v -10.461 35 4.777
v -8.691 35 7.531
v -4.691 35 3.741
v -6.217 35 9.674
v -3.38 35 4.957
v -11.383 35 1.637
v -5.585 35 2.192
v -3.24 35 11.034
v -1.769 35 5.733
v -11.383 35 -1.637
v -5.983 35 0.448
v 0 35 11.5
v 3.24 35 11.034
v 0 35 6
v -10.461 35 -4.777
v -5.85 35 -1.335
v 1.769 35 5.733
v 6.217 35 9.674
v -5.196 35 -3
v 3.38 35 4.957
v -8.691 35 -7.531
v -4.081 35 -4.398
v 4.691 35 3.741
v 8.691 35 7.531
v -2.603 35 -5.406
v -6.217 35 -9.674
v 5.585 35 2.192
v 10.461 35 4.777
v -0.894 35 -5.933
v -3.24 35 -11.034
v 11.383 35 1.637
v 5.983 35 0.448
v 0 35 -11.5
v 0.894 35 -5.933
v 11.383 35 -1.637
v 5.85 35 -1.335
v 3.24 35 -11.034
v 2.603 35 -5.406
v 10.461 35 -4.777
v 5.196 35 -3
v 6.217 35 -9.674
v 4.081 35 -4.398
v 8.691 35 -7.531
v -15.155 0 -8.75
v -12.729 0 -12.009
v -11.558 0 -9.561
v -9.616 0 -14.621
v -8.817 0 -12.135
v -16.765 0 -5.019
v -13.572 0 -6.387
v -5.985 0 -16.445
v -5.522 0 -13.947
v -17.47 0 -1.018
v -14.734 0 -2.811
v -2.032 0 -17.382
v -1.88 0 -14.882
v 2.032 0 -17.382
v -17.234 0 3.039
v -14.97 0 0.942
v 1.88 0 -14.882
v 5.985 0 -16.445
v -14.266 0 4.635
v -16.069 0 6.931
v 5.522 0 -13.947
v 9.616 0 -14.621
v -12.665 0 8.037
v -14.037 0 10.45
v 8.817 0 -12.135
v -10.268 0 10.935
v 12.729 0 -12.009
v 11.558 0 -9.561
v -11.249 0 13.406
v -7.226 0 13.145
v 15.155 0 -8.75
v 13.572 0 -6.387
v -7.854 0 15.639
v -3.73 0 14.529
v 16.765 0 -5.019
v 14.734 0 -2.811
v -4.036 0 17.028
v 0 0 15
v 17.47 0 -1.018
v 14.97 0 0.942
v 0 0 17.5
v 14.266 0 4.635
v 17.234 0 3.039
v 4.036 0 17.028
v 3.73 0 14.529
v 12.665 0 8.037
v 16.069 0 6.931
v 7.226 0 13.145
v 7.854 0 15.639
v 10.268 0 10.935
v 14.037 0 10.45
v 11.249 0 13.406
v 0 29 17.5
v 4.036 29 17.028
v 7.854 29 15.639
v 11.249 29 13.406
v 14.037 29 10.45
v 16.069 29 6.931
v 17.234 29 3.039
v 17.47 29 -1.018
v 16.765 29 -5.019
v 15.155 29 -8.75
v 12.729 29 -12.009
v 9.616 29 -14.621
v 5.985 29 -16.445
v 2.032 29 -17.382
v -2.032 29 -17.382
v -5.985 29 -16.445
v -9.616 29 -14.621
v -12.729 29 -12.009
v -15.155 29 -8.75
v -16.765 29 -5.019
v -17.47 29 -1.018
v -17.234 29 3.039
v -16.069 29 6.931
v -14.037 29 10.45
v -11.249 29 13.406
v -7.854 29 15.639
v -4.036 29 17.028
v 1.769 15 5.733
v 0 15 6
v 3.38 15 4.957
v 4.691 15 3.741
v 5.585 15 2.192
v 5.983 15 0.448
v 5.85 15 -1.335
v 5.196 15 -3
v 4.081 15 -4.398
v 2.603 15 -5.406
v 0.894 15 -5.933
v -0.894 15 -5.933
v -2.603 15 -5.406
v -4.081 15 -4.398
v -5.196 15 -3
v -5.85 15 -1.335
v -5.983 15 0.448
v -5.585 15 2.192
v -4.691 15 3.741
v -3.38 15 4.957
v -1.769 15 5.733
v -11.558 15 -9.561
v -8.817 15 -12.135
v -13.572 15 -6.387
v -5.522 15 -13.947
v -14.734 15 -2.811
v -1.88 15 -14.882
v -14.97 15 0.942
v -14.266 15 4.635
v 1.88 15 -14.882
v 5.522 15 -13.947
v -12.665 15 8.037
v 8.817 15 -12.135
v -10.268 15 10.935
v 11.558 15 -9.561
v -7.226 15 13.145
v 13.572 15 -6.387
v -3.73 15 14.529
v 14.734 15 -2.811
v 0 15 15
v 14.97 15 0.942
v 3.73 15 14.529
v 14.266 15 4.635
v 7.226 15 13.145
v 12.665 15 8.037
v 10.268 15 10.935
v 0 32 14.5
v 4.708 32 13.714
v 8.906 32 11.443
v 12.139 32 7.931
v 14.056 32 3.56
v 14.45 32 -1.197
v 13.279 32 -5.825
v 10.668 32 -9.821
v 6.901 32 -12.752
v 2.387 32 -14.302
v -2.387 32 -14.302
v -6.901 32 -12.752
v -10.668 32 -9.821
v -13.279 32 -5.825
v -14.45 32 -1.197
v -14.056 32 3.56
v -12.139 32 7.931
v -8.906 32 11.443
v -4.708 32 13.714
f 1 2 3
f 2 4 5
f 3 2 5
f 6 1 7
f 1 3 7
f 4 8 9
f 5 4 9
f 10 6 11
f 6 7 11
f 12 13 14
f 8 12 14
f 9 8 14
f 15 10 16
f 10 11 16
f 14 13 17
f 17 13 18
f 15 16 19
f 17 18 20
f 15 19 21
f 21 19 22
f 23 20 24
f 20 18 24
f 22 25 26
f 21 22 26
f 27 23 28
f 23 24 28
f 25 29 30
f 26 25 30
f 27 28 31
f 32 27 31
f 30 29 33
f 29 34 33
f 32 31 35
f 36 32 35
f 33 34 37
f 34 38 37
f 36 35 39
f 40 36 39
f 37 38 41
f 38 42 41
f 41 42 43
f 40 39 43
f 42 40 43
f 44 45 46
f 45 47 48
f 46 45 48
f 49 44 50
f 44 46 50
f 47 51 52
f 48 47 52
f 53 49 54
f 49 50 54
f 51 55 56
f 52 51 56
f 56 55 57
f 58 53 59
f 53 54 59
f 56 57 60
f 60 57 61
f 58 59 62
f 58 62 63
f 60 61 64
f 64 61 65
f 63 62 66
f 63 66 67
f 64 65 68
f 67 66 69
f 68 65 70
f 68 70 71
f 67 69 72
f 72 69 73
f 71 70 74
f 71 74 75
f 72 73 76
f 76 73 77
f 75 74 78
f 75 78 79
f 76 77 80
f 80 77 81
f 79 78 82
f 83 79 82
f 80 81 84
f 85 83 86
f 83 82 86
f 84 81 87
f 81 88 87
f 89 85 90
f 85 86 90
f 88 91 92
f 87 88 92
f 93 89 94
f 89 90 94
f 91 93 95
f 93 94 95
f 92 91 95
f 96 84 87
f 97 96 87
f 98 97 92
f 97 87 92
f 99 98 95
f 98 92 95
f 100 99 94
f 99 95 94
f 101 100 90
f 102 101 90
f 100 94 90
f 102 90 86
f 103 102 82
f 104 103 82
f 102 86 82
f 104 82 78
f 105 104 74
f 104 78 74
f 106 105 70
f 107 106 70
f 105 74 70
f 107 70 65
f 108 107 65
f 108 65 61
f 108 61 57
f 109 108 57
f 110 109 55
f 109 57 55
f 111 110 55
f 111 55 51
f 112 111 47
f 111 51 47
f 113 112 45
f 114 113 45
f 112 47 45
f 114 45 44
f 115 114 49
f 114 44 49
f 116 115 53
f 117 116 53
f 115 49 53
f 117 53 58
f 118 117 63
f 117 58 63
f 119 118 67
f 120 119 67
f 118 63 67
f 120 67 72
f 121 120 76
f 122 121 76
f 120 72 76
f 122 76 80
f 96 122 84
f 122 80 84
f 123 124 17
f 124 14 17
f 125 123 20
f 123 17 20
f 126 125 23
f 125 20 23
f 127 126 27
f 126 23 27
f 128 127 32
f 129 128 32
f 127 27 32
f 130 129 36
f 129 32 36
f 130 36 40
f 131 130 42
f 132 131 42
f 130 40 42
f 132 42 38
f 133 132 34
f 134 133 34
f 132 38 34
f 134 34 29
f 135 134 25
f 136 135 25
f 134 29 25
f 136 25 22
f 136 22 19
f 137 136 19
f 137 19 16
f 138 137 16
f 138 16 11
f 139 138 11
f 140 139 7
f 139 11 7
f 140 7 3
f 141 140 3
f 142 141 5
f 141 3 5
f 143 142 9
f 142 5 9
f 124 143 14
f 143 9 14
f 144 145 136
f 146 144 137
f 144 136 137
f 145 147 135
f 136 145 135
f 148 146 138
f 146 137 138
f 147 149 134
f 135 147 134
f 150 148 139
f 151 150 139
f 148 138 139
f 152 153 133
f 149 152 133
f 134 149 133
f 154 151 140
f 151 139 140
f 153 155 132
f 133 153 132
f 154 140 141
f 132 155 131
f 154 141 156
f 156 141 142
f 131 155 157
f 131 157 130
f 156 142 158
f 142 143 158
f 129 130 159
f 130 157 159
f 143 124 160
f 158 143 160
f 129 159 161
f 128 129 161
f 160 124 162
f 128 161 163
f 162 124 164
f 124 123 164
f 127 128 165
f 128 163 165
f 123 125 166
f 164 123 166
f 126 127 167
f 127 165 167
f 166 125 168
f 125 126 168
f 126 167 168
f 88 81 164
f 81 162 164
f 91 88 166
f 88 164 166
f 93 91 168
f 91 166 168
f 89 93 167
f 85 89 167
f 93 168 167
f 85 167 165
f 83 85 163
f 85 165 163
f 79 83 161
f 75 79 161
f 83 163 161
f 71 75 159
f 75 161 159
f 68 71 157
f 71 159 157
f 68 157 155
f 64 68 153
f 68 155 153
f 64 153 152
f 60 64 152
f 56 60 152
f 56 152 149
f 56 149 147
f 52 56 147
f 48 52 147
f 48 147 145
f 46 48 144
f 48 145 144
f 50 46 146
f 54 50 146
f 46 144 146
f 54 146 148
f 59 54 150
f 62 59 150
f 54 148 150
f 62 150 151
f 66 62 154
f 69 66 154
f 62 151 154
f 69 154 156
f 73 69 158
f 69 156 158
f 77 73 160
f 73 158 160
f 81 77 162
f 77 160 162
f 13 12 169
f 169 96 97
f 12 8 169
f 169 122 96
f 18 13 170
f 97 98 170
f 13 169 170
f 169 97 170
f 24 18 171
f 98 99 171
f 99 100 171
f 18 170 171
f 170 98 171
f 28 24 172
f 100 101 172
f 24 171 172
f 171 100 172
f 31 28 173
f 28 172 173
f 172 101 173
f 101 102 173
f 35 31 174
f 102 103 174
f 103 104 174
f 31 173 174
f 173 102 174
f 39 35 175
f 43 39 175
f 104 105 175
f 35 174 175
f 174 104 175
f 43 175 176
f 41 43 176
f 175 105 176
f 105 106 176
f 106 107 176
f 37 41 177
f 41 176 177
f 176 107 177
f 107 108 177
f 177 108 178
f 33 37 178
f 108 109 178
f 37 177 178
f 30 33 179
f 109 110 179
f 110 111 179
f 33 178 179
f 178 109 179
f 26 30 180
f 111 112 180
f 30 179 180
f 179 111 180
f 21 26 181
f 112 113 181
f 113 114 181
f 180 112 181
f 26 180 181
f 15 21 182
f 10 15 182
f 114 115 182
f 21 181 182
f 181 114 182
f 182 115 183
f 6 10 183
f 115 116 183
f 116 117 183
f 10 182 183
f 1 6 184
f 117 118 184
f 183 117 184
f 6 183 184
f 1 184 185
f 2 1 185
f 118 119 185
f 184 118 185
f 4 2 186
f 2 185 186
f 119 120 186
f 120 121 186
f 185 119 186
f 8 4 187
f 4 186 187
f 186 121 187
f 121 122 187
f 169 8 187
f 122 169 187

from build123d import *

# Parameters (mm, degrees)
F2_SIZE = 6


with BuildPart() as f1:
    # F0 (on Right) → F1 (revolve)
    with BuildSketch(Plane.YZ):
        Polygon((15, 6), (35, 6), (35, 17.5), (0, 17.5), (0, 15), (15, 15), align=None)
    revolve(axis=Axis((0, 7.5, 0), (0, 1, 0)))

    # F2
    f2_edges = [f1.edges().sort_by_distance(p)[0] for p in [
        (0, 35, -17.5),
    ]]
    chamfer(f2_edges, length=F2_SIZE)


solid = f1.part
